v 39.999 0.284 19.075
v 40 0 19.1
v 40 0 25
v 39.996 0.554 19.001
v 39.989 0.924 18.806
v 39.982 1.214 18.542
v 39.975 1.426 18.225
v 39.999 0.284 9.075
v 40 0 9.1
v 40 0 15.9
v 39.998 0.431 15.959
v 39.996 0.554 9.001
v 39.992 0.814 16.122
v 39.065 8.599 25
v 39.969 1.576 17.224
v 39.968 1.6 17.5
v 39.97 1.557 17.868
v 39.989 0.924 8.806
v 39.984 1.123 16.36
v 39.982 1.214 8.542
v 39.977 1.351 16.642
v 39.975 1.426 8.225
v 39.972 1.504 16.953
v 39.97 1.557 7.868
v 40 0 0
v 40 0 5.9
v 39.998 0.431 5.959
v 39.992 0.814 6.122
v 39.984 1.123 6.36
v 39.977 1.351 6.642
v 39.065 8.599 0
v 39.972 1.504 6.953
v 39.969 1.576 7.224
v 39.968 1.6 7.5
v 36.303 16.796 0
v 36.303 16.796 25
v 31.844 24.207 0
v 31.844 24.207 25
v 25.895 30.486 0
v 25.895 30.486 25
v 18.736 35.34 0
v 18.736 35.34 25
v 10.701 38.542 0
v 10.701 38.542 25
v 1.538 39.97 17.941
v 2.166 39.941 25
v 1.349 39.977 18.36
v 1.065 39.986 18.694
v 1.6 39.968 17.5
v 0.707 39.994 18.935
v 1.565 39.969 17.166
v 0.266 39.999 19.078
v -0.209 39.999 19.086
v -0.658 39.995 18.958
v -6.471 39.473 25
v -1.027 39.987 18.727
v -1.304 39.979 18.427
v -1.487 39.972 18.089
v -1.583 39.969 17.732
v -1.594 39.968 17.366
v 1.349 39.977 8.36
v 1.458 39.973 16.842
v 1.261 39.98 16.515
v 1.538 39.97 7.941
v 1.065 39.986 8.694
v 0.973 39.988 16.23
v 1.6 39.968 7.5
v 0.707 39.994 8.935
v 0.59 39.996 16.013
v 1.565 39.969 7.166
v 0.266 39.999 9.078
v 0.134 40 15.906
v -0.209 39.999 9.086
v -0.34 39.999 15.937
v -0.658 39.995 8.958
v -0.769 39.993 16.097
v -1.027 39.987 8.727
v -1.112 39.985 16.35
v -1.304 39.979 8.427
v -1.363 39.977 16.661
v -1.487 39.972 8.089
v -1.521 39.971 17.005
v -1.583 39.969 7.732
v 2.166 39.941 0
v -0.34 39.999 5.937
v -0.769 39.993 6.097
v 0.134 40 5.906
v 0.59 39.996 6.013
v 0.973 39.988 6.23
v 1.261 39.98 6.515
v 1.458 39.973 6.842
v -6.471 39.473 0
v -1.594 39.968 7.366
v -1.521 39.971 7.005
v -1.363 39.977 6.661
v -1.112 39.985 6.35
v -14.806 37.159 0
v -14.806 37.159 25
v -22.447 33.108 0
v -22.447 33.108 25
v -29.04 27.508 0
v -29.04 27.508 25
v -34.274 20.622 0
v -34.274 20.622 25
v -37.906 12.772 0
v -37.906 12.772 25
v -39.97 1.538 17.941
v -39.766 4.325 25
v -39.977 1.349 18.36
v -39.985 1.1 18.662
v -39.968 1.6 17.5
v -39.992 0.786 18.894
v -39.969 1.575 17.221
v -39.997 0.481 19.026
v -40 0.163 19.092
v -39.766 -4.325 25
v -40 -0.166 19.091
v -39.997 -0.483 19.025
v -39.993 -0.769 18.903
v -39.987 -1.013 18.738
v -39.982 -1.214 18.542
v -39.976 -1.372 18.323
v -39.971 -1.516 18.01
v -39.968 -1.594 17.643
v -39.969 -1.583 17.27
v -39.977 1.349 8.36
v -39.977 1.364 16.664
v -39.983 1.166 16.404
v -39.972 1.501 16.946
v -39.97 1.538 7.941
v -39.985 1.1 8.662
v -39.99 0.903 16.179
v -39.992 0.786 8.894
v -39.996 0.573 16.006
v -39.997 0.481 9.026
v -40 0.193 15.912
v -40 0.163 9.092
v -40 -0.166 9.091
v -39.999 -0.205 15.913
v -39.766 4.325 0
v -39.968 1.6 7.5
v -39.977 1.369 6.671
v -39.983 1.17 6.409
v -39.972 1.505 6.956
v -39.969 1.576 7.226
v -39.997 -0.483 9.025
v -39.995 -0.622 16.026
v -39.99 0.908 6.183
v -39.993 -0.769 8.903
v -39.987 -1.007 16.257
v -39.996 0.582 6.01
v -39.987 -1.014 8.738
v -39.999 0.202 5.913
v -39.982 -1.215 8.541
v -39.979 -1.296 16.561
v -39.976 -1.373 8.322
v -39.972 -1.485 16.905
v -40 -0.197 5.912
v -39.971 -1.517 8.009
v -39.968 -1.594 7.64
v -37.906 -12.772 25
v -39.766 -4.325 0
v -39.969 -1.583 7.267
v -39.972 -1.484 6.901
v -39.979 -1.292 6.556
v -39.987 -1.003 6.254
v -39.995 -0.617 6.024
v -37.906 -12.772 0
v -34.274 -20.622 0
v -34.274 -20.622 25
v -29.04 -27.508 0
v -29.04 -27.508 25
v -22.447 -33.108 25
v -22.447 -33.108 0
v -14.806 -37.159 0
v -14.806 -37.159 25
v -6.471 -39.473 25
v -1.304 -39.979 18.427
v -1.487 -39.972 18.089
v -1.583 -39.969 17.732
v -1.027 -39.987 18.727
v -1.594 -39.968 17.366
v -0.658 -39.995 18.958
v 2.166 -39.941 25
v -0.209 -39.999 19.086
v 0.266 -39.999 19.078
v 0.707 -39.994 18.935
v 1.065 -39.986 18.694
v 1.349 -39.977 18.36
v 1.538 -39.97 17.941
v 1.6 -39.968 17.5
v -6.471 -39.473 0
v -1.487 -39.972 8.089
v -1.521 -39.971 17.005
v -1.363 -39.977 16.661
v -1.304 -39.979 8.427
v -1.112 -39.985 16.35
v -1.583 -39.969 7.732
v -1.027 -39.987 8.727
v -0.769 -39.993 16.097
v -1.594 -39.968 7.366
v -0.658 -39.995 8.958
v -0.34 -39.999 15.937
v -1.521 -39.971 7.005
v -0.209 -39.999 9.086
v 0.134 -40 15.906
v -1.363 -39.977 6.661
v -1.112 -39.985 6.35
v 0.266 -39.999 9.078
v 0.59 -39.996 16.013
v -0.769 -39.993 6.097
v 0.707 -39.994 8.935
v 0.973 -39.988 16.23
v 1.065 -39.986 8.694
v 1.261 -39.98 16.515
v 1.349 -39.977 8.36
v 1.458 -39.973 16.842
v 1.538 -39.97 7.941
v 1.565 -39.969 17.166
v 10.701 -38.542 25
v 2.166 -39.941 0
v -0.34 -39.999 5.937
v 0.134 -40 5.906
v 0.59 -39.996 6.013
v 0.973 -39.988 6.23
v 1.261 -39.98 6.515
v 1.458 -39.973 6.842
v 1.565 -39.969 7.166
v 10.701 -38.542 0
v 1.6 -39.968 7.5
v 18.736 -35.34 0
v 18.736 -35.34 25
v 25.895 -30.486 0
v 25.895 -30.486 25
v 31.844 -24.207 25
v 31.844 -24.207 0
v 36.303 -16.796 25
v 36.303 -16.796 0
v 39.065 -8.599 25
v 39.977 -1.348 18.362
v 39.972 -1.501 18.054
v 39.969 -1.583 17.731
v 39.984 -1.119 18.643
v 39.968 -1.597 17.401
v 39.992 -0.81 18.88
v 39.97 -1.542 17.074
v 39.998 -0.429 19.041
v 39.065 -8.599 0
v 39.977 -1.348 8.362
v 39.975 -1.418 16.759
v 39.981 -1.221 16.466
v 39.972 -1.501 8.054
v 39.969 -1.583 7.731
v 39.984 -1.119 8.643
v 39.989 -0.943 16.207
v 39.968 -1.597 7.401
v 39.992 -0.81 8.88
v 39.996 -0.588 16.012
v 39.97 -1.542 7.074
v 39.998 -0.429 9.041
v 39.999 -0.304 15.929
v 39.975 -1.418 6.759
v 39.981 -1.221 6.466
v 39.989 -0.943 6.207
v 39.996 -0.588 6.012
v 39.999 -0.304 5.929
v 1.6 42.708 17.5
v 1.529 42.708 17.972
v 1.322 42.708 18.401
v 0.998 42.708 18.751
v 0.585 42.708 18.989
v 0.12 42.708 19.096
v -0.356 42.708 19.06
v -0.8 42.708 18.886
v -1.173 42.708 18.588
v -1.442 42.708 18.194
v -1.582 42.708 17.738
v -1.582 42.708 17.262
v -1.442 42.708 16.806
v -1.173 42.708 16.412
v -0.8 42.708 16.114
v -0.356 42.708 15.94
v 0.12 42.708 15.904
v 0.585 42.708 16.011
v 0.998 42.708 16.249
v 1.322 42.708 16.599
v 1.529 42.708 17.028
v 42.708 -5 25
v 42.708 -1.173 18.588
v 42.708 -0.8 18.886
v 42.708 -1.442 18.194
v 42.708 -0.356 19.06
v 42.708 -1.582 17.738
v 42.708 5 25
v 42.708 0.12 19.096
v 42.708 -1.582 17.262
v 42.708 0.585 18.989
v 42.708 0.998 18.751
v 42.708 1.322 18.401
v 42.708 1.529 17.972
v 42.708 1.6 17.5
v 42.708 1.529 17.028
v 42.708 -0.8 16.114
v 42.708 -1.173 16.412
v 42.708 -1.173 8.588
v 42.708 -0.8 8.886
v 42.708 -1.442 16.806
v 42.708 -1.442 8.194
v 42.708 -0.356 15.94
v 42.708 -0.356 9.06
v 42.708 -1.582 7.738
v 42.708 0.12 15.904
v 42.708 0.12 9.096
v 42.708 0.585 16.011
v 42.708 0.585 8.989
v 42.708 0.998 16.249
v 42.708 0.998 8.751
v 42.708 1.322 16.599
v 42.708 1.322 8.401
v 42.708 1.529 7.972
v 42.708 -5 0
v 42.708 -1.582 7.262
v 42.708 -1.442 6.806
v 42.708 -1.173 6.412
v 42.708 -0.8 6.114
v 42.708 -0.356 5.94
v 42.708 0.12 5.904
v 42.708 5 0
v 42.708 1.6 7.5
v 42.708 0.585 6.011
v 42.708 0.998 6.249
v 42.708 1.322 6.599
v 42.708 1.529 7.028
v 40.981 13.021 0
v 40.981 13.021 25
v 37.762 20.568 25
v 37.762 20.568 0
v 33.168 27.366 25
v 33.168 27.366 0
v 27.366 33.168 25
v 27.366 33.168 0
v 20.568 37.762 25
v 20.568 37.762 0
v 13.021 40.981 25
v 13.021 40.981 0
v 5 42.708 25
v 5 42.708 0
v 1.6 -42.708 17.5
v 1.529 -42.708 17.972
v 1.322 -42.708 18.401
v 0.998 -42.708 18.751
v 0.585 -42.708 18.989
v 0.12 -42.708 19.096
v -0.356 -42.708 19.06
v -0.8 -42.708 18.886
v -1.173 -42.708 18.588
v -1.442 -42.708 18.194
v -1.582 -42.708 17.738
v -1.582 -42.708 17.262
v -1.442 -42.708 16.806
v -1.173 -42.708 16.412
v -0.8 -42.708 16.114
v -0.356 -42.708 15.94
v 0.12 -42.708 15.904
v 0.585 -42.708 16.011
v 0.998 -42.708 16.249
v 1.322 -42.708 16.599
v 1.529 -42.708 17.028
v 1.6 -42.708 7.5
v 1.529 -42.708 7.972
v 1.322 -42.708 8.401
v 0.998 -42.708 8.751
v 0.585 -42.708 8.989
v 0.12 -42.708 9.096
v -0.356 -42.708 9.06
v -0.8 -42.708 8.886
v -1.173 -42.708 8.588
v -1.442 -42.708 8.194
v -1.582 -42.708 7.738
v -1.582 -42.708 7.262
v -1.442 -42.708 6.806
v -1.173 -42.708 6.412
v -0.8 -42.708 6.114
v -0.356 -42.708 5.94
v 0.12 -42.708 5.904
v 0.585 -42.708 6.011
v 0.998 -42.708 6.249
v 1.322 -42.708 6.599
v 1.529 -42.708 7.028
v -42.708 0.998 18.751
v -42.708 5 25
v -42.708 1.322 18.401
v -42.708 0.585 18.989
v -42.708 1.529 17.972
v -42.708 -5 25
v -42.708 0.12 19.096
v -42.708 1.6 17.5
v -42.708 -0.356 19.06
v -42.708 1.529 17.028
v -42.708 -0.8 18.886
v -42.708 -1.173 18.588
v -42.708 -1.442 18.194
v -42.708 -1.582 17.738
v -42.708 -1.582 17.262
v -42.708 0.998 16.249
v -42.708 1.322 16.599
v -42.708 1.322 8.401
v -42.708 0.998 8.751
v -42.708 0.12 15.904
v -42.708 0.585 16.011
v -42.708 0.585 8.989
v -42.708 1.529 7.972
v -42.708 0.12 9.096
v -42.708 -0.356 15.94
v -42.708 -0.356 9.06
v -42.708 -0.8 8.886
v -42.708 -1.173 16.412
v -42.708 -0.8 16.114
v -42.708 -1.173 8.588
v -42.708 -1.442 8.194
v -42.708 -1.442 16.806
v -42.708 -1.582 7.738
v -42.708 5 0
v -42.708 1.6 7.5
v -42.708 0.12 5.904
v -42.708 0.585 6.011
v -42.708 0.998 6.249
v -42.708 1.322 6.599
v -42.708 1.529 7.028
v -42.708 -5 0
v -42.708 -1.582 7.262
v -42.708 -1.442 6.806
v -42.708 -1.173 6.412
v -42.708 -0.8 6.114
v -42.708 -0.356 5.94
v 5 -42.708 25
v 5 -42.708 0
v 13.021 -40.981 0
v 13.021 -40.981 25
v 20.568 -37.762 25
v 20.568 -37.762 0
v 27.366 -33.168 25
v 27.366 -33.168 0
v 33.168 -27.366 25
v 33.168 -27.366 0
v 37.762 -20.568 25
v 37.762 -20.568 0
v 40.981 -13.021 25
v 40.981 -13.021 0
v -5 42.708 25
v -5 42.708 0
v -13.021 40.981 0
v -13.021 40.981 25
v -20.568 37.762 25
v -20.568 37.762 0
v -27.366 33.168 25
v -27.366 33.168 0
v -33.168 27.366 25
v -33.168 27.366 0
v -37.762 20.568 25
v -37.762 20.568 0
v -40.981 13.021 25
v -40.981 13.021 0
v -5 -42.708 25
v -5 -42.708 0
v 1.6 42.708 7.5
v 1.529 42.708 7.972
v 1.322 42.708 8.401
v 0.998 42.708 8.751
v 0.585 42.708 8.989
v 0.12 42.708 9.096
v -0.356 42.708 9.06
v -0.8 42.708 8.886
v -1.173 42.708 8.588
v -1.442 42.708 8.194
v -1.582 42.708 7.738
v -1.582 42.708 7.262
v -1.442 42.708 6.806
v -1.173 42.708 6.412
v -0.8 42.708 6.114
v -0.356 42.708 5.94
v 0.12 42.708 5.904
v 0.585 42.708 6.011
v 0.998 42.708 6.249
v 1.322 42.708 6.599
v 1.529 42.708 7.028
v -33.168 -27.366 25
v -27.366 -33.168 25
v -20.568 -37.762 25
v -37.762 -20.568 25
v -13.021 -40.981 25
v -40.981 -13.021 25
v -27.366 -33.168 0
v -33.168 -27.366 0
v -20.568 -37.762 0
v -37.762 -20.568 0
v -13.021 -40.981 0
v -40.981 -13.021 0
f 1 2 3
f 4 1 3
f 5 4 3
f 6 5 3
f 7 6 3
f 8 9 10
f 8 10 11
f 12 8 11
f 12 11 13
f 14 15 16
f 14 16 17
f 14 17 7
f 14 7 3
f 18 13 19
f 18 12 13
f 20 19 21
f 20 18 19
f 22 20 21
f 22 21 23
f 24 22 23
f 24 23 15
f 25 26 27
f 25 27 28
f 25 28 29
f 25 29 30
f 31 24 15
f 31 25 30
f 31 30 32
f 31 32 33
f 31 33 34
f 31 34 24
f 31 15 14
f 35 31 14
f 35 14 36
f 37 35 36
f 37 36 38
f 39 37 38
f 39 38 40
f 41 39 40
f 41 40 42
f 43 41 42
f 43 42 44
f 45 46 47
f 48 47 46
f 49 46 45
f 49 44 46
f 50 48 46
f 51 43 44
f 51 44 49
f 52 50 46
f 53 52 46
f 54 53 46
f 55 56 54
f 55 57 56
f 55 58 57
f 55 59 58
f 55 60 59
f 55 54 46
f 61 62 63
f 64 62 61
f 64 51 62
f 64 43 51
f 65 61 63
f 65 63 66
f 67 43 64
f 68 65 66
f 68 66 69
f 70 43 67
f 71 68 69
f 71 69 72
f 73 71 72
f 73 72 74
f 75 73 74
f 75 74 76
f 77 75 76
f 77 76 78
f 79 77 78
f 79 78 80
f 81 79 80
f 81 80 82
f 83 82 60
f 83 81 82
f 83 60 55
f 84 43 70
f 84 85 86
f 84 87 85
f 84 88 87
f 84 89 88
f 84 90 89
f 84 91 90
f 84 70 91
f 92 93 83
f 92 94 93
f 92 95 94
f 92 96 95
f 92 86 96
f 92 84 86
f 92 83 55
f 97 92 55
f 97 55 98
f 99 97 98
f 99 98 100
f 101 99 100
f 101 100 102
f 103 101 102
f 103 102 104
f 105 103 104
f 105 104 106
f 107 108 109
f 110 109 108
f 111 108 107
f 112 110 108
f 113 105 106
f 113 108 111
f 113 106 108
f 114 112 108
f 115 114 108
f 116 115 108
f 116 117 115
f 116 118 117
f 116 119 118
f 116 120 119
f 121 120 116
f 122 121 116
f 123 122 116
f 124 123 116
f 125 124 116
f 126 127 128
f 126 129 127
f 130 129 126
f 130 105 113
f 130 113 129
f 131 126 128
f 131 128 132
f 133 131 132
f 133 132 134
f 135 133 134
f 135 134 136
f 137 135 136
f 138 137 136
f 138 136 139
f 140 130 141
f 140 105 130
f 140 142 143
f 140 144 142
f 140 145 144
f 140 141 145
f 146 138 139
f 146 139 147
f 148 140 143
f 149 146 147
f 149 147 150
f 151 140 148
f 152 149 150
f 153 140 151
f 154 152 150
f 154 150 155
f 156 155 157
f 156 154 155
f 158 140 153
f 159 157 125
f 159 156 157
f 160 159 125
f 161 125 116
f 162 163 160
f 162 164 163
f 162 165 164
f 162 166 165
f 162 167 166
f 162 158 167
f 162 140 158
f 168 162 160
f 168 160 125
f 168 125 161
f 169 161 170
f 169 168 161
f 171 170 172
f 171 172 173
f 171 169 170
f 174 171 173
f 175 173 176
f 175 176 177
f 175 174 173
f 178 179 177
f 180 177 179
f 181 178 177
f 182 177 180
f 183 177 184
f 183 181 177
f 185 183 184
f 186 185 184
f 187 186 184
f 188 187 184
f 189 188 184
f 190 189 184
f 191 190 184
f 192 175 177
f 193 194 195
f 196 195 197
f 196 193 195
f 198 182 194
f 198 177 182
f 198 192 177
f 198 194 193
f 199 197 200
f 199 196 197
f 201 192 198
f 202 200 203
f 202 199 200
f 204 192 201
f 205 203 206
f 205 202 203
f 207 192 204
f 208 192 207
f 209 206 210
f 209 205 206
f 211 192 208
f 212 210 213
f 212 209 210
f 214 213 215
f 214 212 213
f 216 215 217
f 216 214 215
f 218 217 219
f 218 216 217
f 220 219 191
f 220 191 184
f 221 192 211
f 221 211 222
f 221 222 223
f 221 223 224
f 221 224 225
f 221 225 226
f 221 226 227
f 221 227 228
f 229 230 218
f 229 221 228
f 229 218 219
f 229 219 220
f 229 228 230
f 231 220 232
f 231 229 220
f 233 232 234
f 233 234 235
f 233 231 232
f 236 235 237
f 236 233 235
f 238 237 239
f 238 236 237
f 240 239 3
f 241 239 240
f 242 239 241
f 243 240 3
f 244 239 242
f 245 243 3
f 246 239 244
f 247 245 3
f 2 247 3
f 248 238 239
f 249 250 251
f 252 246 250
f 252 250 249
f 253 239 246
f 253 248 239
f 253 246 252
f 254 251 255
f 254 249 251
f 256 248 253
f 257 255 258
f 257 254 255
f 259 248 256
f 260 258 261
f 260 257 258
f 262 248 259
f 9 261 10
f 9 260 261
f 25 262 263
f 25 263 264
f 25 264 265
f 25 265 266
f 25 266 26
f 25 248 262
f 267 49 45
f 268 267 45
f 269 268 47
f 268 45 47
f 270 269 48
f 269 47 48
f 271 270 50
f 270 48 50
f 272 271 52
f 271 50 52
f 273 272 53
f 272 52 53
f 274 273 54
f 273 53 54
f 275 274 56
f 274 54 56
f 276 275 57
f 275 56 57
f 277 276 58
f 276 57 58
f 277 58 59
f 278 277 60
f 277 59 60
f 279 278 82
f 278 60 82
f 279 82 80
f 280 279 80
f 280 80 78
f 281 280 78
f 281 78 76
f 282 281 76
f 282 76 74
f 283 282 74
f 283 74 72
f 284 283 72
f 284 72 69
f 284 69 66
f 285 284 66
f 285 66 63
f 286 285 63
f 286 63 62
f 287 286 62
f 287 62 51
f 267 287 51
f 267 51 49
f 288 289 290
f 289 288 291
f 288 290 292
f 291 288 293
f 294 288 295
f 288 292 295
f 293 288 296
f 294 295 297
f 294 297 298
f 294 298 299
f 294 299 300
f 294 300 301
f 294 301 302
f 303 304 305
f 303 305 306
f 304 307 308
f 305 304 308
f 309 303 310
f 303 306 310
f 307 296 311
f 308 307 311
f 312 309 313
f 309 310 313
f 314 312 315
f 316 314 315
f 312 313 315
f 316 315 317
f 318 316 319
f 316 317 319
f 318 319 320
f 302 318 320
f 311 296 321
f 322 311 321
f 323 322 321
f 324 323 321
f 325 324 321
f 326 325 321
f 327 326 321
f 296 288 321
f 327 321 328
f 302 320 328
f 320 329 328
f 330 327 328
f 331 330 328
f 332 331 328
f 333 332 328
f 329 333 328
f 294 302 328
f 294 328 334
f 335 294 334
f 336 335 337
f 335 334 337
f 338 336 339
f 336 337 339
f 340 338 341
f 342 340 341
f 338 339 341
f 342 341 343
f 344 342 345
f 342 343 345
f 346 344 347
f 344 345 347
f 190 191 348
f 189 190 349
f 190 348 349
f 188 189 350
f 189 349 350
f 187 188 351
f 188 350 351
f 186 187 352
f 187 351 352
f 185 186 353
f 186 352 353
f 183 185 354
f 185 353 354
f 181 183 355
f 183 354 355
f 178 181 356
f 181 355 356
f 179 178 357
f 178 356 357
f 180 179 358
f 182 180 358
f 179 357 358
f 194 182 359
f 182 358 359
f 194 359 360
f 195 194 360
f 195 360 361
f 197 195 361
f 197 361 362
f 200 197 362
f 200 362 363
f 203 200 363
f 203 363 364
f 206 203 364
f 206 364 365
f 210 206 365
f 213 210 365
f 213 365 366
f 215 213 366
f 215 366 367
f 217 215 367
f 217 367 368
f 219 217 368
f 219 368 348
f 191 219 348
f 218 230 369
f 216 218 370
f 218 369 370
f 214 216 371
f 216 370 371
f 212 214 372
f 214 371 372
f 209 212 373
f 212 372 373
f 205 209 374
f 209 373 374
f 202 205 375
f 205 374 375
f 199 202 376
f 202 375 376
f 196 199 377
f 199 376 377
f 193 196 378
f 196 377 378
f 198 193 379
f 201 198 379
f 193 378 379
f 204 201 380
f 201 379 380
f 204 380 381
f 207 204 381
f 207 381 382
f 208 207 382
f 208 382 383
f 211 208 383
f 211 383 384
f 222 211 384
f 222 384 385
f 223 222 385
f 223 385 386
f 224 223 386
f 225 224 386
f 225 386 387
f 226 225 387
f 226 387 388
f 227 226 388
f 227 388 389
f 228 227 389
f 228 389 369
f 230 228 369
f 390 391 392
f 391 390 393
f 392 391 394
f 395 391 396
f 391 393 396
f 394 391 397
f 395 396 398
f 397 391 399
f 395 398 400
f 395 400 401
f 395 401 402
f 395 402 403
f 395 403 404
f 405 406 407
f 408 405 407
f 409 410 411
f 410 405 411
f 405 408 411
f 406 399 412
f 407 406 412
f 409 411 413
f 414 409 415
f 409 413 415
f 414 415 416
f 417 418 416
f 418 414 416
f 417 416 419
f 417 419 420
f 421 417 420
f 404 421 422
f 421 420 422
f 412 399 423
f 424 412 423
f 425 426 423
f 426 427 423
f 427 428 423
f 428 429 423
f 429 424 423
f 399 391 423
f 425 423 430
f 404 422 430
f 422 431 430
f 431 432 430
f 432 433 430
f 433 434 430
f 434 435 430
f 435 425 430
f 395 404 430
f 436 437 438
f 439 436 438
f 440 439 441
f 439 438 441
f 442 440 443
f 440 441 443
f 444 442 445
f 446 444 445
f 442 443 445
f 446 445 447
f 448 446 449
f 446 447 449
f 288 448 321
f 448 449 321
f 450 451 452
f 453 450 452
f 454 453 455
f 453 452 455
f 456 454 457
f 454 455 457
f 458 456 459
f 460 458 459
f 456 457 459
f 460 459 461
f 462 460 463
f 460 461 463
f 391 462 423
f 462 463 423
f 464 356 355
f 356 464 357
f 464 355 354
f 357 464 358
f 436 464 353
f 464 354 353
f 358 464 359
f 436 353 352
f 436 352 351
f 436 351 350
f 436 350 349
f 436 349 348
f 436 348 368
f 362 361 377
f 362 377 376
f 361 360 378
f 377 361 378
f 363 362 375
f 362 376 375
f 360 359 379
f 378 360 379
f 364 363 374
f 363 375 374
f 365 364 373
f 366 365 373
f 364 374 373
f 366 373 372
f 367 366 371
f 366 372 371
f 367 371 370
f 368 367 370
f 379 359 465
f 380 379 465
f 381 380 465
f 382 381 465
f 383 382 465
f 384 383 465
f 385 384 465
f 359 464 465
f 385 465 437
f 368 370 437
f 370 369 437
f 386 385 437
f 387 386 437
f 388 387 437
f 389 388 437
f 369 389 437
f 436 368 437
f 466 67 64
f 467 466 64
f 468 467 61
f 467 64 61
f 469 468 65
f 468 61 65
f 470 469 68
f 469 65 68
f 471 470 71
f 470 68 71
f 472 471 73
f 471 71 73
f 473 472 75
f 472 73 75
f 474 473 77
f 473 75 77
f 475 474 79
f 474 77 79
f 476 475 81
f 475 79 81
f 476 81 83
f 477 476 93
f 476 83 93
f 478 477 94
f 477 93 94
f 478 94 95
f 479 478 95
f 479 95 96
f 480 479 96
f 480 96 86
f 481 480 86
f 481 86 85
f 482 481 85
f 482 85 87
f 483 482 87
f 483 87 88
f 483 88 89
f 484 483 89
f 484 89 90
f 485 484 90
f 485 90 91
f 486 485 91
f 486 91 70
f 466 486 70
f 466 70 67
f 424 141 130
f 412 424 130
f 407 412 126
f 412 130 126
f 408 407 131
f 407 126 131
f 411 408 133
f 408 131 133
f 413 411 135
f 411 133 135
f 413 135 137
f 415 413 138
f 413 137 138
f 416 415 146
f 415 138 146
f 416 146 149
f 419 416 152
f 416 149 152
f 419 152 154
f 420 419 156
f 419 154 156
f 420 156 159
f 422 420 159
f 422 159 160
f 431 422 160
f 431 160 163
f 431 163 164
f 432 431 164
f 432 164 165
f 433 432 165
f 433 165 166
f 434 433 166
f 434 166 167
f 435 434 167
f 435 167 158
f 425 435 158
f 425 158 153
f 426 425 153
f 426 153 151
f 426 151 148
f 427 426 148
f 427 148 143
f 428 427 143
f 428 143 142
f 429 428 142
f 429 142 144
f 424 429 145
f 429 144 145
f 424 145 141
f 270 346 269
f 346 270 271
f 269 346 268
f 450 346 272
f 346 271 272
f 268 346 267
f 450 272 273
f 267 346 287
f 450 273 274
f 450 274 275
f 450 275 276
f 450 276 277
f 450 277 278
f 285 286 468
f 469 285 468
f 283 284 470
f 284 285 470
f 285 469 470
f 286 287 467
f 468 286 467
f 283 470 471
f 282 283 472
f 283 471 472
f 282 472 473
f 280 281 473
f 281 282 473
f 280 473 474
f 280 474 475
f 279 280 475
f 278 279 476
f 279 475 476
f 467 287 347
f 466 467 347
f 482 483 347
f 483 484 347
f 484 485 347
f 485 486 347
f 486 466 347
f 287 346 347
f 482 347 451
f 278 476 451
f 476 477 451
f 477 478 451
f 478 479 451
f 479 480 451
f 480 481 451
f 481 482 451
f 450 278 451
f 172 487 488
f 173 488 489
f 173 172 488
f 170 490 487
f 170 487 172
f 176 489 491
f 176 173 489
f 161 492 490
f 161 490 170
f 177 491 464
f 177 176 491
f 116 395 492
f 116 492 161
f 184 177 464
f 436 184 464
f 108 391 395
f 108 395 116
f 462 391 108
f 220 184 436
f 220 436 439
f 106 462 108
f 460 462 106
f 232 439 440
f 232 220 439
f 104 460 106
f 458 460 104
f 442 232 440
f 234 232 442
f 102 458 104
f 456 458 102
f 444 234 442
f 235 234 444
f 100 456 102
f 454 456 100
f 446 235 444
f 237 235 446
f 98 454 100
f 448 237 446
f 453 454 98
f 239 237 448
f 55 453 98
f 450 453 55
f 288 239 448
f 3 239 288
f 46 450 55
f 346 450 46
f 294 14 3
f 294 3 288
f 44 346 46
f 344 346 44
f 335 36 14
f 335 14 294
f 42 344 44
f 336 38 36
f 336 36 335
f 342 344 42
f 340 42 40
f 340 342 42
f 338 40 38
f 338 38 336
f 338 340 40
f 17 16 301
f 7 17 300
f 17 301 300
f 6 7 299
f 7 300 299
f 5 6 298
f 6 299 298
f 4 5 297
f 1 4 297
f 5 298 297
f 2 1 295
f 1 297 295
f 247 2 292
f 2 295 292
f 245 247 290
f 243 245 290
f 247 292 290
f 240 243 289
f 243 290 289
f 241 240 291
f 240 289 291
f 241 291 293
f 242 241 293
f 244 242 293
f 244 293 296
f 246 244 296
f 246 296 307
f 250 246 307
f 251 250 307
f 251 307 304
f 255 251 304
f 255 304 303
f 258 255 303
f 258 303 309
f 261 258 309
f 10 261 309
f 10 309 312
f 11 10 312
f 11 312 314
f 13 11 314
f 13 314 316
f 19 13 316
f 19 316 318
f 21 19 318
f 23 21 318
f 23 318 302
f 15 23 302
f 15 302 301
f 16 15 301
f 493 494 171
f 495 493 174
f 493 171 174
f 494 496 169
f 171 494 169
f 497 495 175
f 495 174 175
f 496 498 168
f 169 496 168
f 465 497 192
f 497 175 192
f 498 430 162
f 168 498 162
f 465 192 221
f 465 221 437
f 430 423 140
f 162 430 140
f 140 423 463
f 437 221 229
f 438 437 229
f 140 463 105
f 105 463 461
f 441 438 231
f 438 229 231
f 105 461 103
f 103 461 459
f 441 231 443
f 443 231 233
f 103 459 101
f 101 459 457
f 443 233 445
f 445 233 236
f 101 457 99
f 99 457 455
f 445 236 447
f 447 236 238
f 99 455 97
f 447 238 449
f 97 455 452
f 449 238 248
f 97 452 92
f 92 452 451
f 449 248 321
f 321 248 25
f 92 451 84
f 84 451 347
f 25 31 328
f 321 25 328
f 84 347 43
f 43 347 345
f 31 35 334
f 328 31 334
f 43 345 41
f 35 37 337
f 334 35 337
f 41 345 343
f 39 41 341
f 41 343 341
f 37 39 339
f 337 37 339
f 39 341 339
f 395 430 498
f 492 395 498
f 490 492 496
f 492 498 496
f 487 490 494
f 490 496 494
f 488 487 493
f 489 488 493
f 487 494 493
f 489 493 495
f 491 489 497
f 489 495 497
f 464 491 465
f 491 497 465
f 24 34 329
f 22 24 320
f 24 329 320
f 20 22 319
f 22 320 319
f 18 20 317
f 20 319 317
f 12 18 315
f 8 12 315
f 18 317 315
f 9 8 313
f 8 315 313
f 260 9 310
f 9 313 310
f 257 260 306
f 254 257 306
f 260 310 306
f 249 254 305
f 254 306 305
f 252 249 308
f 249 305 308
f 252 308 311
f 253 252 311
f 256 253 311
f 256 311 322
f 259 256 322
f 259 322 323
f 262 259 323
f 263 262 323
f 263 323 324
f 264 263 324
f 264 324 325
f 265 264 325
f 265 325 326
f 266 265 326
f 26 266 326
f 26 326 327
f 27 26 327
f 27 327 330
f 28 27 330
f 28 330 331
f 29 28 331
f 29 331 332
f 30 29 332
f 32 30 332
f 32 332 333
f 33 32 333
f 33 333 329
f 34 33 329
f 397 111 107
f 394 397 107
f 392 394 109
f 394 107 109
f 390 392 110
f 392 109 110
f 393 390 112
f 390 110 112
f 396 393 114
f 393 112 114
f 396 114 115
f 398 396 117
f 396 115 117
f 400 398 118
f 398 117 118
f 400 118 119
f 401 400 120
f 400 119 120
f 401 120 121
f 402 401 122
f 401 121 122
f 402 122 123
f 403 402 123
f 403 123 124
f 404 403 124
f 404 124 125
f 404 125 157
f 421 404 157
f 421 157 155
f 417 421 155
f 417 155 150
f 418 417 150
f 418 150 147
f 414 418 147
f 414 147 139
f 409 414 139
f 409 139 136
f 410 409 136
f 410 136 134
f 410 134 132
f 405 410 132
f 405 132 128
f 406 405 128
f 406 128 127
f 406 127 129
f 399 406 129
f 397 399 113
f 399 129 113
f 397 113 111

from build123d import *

# Parameters (mm, degrees)
F0_R     = 40
F1_DEPTH = 25
F2_R     = 1.6
F3_DEPTH = 85.4176260163
F4_R     = 1.6
F5_DEPTH = 85.4176260163


with BuildPart() as f1:
    # F0 (on Top) → F1 (new body)
    with BuildSketch(Plane.XY):
        with BuildLine():
            Line((42.7083130081, -5), (42.7083130081, 5))
            ThreePointArc((42.7083130081, 5), (30.405591591, 30.405591591), (5, 42.7083130081))
            Line((5, 42.7083130081), (-5, 42.7083130081))
            ThreePointArc((-5, 42.7083130081), (-30.405591591, 30.405591591), (-42.7083130081, 5))
            Line((-42.7083130081, 5), (-42.7083130081, -5))
            ThreePointArc((-42.7083130081, -5), (-30.405591591, -30.405591591), (-5, -42.7083130081))
            Line((-5, -42.7083130081), (5, -42.7083130081))
            ThreePointArc((5, -42.7083130081), (30.405591591, -30.405591591), (42.7083130081, -5))
        make_face()
        Circle(F0_R, mode=Mode.SUBTRACT)
    extrude(amount=F1_DEPTH)

    # F2 (on face) → F3 (cut, through all)
    with BuildSketch(Plane.YZ.offset(42.7083130081)):
        with Locations((0, 17.5)):
            Circle(F2_R)
        with Locations((0, 7.5)):
            Circle(F2_R)
    extrude(amount=-F3_DEPTH, mode=Mode.SUBTRACT)

    # F4 (on face) → F5 (cut, through all)
    with BuildSketch(Plane.XZ.offset(42.7083130081)):
        with Locations((0, 17.5)):
            Circle(F4_R)
        with Locations((0, 7.5)):
            Circle(F4_R)
    extrude(amount=-F5_DEPTH, mode=Mode.SUBTRACT)


solid = f1.part
